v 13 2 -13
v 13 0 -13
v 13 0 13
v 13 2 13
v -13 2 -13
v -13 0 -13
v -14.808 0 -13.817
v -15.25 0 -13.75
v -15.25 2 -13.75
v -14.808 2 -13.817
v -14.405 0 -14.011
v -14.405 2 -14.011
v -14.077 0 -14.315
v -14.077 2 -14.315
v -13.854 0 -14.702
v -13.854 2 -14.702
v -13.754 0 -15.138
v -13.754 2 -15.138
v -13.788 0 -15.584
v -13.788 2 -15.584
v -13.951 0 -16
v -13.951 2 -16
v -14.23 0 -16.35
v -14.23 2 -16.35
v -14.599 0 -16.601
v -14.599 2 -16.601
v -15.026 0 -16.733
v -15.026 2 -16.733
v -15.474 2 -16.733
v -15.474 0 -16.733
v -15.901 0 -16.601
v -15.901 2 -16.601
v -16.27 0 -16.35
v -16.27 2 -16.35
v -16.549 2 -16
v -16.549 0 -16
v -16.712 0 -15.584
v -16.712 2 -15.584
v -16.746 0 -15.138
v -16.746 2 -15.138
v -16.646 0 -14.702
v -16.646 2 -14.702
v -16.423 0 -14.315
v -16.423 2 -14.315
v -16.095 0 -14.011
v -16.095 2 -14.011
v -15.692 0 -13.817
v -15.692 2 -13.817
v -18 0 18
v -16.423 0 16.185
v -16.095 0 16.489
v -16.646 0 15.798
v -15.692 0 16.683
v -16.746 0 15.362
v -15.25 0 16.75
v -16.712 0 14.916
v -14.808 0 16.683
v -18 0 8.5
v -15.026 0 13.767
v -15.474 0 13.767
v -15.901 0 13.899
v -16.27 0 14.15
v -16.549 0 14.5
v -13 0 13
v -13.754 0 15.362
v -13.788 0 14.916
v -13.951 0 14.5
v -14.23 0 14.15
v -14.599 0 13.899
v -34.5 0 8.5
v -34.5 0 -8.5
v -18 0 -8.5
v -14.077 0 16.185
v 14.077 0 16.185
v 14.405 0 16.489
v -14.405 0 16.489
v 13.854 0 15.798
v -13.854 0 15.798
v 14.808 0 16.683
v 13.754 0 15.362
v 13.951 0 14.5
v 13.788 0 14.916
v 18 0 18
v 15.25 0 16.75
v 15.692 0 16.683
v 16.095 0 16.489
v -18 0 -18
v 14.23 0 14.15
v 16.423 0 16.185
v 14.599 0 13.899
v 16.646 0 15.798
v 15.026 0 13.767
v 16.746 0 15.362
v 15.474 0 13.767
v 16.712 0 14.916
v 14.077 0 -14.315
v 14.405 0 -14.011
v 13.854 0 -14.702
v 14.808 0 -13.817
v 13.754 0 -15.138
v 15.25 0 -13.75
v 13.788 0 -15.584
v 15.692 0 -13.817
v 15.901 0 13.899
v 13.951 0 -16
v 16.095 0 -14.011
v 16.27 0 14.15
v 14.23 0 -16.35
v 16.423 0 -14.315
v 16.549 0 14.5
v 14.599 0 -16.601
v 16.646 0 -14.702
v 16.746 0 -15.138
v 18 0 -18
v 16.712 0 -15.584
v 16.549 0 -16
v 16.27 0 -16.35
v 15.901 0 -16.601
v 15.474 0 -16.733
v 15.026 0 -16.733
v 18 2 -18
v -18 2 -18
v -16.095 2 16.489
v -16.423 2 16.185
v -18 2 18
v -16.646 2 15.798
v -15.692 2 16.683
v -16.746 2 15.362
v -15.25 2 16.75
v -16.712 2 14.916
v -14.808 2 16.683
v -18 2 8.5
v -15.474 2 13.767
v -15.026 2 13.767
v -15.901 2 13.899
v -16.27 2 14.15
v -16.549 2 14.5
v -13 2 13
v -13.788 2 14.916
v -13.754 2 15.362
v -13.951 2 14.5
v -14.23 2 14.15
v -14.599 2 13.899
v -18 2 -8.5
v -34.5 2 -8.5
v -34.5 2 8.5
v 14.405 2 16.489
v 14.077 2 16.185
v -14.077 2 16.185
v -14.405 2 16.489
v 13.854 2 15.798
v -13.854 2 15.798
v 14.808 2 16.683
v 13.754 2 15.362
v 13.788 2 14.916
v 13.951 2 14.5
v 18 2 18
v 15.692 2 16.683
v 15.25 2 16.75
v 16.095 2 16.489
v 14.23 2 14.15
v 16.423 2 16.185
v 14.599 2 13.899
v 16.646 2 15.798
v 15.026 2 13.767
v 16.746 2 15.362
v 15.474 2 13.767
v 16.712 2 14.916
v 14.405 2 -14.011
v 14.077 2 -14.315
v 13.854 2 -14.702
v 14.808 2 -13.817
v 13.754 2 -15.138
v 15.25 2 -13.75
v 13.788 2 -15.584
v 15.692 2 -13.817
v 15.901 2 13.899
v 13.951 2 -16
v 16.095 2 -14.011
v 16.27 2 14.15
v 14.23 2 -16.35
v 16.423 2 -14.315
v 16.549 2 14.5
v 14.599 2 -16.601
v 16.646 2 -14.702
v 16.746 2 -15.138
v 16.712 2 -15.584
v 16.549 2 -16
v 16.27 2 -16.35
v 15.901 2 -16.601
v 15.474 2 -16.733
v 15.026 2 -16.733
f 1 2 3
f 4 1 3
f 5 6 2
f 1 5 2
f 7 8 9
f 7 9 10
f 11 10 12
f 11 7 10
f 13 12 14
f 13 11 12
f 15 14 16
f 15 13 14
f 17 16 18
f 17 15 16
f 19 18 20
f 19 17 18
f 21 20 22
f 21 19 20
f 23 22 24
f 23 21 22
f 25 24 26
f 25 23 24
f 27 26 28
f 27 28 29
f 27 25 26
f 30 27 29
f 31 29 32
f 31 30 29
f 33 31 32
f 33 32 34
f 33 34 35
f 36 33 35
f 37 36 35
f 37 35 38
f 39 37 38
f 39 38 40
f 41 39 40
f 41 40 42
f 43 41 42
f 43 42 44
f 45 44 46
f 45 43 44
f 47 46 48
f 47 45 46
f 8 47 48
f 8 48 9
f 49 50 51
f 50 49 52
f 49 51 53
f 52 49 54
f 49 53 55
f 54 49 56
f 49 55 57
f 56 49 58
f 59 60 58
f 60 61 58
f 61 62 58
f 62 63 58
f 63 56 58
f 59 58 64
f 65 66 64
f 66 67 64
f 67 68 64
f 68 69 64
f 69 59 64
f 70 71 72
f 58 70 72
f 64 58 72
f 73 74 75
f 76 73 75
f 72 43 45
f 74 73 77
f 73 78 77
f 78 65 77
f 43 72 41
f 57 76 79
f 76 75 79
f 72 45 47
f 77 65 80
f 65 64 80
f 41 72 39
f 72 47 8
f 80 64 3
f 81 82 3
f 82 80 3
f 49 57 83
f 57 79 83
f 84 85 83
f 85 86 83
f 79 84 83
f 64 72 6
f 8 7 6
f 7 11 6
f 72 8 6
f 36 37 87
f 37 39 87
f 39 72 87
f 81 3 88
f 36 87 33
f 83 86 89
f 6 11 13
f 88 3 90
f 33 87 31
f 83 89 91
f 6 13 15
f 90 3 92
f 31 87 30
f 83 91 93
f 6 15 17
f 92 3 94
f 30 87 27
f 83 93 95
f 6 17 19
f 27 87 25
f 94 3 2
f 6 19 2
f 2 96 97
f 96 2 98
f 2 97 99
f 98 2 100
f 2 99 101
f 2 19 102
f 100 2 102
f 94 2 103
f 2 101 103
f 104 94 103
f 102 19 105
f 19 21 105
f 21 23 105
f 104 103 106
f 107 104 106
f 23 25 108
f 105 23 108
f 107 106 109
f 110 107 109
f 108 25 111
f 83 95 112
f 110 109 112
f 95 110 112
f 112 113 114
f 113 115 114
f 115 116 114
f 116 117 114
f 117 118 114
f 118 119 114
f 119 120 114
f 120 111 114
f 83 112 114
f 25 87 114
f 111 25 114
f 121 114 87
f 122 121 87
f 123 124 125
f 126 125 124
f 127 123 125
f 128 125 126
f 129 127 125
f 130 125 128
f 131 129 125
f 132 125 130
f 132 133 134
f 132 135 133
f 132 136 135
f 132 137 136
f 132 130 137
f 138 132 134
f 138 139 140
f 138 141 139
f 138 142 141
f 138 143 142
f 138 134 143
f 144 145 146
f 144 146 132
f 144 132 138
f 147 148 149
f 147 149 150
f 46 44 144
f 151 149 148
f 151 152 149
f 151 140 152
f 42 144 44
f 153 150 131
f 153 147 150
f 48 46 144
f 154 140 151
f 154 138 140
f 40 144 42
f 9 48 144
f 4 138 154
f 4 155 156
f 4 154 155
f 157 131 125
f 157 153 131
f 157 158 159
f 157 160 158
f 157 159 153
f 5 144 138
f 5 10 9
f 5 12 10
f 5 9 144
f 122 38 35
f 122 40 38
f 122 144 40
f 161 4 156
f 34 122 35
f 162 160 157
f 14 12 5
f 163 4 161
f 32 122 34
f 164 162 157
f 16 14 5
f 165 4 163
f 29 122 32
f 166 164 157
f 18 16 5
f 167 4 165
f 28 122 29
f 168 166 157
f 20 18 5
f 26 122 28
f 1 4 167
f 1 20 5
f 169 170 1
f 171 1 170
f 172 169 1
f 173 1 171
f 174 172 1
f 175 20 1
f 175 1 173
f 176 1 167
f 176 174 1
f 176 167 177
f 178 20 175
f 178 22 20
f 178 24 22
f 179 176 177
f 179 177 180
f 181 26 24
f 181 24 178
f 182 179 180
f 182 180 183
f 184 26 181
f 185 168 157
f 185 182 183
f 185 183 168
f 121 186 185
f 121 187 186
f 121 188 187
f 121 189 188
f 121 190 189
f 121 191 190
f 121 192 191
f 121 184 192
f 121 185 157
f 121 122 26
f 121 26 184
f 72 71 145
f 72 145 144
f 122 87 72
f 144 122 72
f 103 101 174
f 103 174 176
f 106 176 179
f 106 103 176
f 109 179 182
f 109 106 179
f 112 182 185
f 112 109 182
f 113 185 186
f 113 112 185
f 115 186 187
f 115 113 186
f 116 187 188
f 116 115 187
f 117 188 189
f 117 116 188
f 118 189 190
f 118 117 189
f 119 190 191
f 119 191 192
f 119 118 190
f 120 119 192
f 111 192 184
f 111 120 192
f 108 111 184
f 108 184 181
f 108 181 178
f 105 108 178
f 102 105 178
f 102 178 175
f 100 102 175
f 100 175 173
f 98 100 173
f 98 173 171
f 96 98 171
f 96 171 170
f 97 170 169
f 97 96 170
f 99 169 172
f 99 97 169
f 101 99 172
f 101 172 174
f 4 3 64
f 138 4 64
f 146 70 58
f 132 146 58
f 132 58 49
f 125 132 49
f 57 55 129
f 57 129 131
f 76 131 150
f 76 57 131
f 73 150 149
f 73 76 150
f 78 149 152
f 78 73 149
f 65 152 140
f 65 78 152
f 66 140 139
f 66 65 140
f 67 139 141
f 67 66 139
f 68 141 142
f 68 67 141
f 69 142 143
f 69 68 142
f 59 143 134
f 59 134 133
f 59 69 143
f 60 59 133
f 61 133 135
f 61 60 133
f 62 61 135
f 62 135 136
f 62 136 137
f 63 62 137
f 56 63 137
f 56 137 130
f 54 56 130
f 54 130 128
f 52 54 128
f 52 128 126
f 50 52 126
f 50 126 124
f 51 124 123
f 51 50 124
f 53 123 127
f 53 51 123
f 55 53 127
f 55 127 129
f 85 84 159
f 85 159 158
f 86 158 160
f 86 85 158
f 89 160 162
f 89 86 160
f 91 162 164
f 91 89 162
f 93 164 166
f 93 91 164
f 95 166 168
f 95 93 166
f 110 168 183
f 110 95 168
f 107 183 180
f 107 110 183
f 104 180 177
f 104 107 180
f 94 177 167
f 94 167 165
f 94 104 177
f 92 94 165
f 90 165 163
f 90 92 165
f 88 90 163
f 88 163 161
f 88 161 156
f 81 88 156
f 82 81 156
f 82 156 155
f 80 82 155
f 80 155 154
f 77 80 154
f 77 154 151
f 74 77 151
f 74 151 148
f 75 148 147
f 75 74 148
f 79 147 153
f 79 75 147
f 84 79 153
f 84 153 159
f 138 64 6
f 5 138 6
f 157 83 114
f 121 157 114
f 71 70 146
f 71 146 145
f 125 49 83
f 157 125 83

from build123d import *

# Parameters (mm, degrees)
CROQUIS1_W              = 16.5
CROQUIS1_H              = 17
CROQUIS1_R              = 1.5
CROQUIS1_W_2            = 5
SALIENTE_EXTRUIR1_DEPTH = 2


with BuildPart() as part:
    # Croquis1 → Saliente-Extruir1 (new body)
    # profile 1 of 3: a face of its own
    with BuildSketch(Plane(origin=(0, 0, 0), x_dir=(1, 0, 0), z_dir=(0, 1, 0))):
        with Locations((-26.25, 0)):
            Rectangle(CROQUIS1_W, CROQUIS1_H)
    # profile 2 of 3: a face of its own
    with BuildSketch(Plane(origin=(0, 0, 0), x_dir=(1, 0, 0), z_dir=(0, 1, 0))):
        Polygon((13, -13), (-13, -13), (-13, -8.5), (-18, -8.5), (-18, -18), (18, -18), (18, 18), (-18, 18), (-18, 8.5), (-13, 8.5), (-13, 13), (13, 13), align=None)
        with Locations(Location((-15.25, -15.25, 0), (0, 0, 270))):
            Circle(CROQUIS1_R, mode=Mode.SUBTRACT)
        with Locations(Location((15.25, -15.25, 0), (0, 0, 270))):
            Circle(CROQUIS1_R, mode=Mode.SUBTRACT)
        with Locations(Location((-15.25, 15.25, 0), (0, 0, 270))):
            Circle(CROQUIS1_R, mode=Mode.SUBTRACT)
        with Locations(Location((15.25, 15.25, 0), (0, 0, 270))):
            Circle(CROQUIS1_R, mode=Mode.SUBTRACT)
    # profile 3 of 3: a face of its own
    with BuildSketch(Plane(origin=(0, 0, 0), x_dir=(1, 0, 0), z_dir=(0, 1, 0))):
        with Locations((-15.5, 0)):
            Rectangle(CROQUIS1_W_2, CROQUIS1_H)
    extrude(amount=SALIENTE_EXTRUIR1_DEPTH)


solid = part.part
